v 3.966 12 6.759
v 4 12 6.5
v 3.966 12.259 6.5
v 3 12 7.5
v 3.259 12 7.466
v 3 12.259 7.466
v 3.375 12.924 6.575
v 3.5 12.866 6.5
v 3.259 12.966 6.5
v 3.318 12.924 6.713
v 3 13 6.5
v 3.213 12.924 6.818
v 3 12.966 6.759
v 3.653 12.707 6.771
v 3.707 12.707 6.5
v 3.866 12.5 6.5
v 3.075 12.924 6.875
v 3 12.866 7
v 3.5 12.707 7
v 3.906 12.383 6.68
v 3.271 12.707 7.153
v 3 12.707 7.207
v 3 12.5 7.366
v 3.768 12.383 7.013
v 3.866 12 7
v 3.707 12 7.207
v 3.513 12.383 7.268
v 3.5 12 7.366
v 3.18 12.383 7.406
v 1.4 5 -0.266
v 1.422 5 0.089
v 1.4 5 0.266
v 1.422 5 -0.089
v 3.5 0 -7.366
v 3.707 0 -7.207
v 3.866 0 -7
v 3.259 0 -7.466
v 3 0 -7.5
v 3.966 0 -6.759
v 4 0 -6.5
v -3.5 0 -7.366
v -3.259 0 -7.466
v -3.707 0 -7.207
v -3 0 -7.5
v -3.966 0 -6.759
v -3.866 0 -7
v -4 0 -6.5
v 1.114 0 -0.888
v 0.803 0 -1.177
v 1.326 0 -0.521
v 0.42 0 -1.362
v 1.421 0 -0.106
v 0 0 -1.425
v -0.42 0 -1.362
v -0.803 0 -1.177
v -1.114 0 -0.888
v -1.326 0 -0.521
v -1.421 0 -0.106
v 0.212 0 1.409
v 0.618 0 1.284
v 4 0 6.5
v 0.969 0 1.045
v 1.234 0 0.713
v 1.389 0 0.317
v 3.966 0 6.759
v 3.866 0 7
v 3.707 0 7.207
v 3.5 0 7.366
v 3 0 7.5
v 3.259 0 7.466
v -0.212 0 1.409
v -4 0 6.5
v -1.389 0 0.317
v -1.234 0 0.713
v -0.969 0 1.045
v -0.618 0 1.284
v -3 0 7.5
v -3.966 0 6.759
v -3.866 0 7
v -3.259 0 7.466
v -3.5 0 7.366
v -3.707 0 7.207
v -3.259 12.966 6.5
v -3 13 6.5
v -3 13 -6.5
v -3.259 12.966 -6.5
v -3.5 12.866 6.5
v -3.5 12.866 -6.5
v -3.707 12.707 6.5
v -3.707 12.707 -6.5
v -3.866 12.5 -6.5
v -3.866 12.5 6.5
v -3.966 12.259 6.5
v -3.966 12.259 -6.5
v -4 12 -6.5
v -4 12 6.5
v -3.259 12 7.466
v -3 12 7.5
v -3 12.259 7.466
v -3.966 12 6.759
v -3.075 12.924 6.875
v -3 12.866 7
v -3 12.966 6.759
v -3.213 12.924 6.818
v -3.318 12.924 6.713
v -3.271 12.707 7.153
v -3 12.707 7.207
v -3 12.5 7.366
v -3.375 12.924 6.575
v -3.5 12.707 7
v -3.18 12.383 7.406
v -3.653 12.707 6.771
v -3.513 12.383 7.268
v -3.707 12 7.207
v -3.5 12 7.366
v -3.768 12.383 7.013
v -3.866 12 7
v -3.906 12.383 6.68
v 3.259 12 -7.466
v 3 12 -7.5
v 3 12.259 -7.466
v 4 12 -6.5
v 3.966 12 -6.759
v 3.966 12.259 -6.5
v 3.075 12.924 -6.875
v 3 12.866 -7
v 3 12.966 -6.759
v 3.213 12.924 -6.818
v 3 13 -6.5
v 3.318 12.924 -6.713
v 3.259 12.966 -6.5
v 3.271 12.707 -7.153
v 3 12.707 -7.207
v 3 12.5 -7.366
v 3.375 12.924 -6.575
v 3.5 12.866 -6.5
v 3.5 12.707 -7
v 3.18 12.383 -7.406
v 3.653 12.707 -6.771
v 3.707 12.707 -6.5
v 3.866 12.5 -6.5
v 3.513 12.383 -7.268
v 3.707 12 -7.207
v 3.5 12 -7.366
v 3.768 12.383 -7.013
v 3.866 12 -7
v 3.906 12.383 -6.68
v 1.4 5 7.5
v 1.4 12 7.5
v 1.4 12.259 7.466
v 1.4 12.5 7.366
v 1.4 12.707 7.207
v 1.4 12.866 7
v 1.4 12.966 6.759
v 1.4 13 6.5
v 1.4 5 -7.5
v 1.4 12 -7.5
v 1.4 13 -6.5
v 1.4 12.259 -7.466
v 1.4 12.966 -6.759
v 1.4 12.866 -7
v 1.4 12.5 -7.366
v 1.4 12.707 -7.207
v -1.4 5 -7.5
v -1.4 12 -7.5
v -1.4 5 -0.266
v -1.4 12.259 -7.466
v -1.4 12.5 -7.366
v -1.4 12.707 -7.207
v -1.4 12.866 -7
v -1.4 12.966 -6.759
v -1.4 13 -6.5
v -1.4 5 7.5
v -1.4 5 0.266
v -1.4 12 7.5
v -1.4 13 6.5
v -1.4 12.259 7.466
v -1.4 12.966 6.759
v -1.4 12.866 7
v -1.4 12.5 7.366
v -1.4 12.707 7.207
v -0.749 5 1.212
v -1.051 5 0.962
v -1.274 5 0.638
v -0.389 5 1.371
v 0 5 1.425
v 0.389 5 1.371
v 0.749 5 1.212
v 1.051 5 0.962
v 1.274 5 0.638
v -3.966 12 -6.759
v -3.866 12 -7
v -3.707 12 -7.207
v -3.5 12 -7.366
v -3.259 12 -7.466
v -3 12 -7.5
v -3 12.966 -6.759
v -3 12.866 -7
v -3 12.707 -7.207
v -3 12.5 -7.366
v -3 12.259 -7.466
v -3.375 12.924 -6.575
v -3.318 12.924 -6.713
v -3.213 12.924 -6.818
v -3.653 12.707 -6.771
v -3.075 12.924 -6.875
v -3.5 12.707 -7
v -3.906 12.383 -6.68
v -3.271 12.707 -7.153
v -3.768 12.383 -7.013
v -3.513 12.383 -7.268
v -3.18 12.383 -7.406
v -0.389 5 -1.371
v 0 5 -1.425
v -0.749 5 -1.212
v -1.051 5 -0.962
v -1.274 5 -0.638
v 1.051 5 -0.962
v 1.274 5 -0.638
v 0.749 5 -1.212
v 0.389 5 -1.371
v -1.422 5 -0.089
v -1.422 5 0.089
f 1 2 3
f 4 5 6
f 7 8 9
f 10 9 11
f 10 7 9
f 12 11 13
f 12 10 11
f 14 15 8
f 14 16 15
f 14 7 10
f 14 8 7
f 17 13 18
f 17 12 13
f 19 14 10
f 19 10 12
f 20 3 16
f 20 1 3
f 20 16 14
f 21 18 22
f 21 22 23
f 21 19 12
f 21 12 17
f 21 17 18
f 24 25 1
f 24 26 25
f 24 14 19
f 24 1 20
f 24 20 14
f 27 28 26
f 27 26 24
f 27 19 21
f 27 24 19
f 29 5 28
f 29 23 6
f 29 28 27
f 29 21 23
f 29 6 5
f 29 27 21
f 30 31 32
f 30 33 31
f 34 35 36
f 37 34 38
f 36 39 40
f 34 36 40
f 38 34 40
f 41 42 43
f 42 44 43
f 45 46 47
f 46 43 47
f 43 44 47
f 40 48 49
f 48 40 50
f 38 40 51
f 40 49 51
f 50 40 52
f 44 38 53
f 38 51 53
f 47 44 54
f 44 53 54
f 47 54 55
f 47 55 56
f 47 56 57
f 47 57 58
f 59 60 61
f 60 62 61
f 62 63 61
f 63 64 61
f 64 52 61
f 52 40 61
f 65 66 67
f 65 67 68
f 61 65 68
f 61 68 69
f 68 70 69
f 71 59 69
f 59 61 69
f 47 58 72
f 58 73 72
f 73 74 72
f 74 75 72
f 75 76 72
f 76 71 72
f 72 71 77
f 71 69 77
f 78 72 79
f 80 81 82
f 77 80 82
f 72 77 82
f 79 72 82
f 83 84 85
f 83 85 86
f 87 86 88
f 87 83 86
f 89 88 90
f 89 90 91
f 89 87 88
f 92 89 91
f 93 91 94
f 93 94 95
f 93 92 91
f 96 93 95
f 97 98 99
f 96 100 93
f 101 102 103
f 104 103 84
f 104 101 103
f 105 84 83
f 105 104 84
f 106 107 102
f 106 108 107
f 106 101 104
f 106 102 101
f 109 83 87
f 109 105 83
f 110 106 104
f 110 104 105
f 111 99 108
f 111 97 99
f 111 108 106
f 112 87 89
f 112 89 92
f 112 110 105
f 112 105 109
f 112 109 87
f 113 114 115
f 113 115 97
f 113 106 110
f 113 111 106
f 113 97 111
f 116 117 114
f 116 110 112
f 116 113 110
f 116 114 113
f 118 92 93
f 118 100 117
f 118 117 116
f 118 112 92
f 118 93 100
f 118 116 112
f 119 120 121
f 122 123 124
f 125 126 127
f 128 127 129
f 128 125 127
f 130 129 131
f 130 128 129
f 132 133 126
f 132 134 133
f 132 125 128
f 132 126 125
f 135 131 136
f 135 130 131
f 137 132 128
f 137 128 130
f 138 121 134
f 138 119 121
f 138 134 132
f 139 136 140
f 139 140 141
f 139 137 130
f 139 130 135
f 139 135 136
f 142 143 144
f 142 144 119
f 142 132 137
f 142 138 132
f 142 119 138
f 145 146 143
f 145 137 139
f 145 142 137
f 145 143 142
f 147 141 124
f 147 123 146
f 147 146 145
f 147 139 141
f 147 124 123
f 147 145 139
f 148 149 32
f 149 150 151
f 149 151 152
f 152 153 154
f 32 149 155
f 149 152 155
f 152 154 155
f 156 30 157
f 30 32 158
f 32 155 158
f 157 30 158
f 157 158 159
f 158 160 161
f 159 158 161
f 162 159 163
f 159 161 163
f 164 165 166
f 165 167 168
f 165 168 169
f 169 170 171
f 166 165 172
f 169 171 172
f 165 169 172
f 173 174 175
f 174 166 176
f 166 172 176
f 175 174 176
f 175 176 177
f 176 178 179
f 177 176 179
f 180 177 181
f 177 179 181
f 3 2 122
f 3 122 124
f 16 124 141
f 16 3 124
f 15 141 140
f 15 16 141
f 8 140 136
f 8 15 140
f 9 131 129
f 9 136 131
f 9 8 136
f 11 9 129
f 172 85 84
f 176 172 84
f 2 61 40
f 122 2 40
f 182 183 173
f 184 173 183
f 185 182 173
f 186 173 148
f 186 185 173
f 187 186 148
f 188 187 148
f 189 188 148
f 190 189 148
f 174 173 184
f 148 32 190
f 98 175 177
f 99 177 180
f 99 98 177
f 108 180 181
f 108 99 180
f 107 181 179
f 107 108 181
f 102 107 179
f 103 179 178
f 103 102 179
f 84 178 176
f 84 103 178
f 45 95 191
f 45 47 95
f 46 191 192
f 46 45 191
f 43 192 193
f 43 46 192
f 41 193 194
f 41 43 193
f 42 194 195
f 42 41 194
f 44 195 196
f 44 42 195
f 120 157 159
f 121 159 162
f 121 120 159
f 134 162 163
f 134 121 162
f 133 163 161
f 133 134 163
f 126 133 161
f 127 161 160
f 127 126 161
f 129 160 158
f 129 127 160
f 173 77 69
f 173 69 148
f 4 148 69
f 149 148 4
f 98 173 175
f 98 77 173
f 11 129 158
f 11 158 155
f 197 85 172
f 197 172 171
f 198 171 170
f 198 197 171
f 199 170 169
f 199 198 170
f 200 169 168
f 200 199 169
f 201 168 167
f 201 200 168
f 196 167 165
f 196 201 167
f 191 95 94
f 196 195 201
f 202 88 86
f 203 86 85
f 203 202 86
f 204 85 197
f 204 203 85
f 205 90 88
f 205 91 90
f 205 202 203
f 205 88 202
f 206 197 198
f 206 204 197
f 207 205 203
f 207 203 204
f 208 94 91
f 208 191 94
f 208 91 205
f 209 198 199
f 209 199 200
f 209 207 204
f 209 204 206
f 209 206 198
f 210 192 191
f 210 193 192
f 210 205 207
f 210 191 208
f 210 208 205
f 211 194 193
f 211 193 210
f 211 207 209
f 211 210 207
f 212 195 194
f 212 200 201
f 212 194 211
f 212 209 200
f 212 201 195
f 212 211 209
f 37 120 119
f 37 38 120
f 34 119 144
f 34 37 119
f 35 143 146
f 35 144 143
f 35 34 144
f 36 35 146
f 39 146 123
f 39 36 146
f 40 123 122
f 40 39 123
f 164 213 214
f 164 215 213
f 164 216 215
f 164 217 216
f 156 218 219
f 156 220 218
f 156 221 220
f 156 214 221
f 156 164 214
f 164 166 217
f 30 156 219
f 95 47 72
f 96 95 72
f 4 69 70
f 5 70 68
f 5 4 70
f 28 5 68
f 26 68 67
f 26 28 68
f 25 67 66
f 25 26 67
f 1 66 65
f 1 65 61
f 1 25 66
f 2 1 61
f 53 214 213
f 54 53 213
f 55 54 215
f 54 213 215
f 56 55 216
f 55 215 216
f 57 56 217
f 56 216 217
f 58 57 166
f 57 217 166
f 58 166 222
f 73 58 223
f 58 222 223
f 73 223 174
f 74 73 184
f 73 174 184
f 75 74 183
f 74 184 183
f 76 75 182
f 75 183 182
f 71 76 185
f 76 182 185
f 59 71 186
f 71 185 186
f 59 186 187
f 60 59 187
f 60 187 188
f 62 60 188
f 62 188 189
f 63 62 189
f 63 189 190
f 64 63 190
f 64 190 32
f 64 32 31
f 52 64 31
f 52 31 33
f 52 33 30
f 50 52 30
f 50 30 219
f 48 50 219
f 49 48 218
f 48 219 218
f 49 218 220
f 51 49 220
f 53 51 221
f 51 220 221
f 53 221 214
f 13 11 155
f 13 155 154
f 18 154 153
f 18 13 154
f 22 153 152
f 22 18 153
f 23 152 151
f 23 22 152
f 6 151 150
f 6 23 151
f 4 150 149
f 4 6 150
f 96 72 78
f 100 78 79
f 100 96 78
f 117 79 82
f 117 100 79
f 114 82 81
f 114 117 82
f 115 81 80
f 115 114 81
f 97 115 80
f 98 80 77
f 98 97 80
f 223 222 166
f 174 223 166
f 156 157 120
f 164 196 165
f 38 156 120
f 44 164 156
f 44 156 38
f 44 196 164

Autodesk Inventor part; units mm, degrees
ref_plane "YZ Plane" through (0, 0, 0) normal (1, 0, 0) x (0, 1, 0)
ref_plane "XZ Plane" through (0, 0, 0) normal (0, 1, 0) x (-1, 0, 0)
ref_plane "XY Plane" through (0, 0, 0) normal (0, 0, 1) x (1, 0, 0)
sketch "Sketch1" plane through (0, 0, 0) normal (0, 1, 0) x (-1, 0, 0)
  line L0 (4, 7.5) -> (-4, 7.5)
  line L1 (-4, 7.5) -> (-4, -7.5)
  line L2 (-4, -7.5) -> (4, -7.5)
  line L3 (4, -7.5) -> (4, 7.5)
  line L4 (4, 7.5) -> (-4, -7.5) construction
  line L5 (-4, 7.5) -> (4, -7.5) construction
  point P0 (0, 0)
  dimension "d0" = 8
  dimension "d1" = 15
extrude "Extrusion1" add sketch "Sketch1" along normal blind 10
sketch "Sketch2" plane through (0, 10, 0) normal (0, 1, 0) x (1, 0, 0)
  line L0 (4, 7.5) -> (-4, 7.5) projected
  line L1 (-1.5, -7.5) -> (1.5, -7.5)
  line L2 (1.5, -7.5) -> (1.5, 7.5)
  line L3 (1.5, 7.5) -> (-1.5, 7.5)
  line L4 (-1.5, 7.5) -> (-1.5, -7.5)
  line L5 (-1.5, -7.5) -> (1.5, 7.5) construction
  line L6 (1.5, -7.5) -> (-1.5, 7.5) construction
  point P0 (0, 0)
  dimension "d4" = 3
extrude "Extrusion2" cut sketch "Sketch2" against normal blind 5
thicken "Thicken1" operation add thickness 2 both sides no extend neighbours yes toward (0, 1, 0) faces at (2.3333, 10, -2.5)
thicken "Thicken2" operation add thickness 2 both sides no extend neighbours yes toward (0, 1, 0) faces at (-3.1667, 10, -2.5)
thicken "Thicken3" operation add thickness 1 both sides no extend neighbours yes toward (0, 1, 0) faces at (-3.1667, 12, -2.5)
thicken "Thicken4" operation add thickness 1 both sides no extend neighbours yes toward (0, 1, 0) faces at (3.1667, 12, 2.5)
fillet "Fillet1" radius 1 10 edges at (4, 6.5, 7.5) (4, 6.5, -7.5) (-4, 6.5, 7.5) (-4, 6.5, -7.5) (4, 13, 0) (-4, 13, 0) (2.75, 13, -7.5) (2.75, 13, 7.5) (-2.75, 13, 7.5) (-2.75, 13, -7.5)
sketch "Sketch3" plane through (0, 0, 0) normal (0, -1, 0) x (1, 0, 0)
  arc A0 (-3, 7.5) -> (-4, 6.5) centre (-3, 6.5) ccw construction
  line L0 (-4, -6.5) -> (-4, 6.5) construction
  arc A1 (-4, -6.5) -> (-3, -7.5) centre (-3, -6.5) ccw construction
  line L1 (3, -7.5) -> (-3, -7.5) construction
  arc A2 (3, -7.5) -> (4, -6.5) centre (3, -6.5) ccw construction
  line L2 (4, 6.5) -> (4, -6.5) construction
  arc A3 (4, 6.5) -> (3, 7.5) centre (3, 6.5) ccw construction
  line L3 (-3, 7.5) -> (3, 7.5) construction
  point P0 (0, 0)
  point P1 (0, 0)
hole "Hole1" at (0, 0, 0) direction (0, 1, 0) diameter 2.85 depth 5
thicken "Thicken7" operation add thickness 0.1 both sides no extend neighbours yes toward (-1, 0, 0) faces at (1.5, 7.6667, -2.1667)
thicken "Thicken8" operation add thickness 0.1 both sides no extend neighbours yes toward (1, 0, 0) faces at (-1.5, 7.6667, 2.1667)
properties part number "zoffset"
